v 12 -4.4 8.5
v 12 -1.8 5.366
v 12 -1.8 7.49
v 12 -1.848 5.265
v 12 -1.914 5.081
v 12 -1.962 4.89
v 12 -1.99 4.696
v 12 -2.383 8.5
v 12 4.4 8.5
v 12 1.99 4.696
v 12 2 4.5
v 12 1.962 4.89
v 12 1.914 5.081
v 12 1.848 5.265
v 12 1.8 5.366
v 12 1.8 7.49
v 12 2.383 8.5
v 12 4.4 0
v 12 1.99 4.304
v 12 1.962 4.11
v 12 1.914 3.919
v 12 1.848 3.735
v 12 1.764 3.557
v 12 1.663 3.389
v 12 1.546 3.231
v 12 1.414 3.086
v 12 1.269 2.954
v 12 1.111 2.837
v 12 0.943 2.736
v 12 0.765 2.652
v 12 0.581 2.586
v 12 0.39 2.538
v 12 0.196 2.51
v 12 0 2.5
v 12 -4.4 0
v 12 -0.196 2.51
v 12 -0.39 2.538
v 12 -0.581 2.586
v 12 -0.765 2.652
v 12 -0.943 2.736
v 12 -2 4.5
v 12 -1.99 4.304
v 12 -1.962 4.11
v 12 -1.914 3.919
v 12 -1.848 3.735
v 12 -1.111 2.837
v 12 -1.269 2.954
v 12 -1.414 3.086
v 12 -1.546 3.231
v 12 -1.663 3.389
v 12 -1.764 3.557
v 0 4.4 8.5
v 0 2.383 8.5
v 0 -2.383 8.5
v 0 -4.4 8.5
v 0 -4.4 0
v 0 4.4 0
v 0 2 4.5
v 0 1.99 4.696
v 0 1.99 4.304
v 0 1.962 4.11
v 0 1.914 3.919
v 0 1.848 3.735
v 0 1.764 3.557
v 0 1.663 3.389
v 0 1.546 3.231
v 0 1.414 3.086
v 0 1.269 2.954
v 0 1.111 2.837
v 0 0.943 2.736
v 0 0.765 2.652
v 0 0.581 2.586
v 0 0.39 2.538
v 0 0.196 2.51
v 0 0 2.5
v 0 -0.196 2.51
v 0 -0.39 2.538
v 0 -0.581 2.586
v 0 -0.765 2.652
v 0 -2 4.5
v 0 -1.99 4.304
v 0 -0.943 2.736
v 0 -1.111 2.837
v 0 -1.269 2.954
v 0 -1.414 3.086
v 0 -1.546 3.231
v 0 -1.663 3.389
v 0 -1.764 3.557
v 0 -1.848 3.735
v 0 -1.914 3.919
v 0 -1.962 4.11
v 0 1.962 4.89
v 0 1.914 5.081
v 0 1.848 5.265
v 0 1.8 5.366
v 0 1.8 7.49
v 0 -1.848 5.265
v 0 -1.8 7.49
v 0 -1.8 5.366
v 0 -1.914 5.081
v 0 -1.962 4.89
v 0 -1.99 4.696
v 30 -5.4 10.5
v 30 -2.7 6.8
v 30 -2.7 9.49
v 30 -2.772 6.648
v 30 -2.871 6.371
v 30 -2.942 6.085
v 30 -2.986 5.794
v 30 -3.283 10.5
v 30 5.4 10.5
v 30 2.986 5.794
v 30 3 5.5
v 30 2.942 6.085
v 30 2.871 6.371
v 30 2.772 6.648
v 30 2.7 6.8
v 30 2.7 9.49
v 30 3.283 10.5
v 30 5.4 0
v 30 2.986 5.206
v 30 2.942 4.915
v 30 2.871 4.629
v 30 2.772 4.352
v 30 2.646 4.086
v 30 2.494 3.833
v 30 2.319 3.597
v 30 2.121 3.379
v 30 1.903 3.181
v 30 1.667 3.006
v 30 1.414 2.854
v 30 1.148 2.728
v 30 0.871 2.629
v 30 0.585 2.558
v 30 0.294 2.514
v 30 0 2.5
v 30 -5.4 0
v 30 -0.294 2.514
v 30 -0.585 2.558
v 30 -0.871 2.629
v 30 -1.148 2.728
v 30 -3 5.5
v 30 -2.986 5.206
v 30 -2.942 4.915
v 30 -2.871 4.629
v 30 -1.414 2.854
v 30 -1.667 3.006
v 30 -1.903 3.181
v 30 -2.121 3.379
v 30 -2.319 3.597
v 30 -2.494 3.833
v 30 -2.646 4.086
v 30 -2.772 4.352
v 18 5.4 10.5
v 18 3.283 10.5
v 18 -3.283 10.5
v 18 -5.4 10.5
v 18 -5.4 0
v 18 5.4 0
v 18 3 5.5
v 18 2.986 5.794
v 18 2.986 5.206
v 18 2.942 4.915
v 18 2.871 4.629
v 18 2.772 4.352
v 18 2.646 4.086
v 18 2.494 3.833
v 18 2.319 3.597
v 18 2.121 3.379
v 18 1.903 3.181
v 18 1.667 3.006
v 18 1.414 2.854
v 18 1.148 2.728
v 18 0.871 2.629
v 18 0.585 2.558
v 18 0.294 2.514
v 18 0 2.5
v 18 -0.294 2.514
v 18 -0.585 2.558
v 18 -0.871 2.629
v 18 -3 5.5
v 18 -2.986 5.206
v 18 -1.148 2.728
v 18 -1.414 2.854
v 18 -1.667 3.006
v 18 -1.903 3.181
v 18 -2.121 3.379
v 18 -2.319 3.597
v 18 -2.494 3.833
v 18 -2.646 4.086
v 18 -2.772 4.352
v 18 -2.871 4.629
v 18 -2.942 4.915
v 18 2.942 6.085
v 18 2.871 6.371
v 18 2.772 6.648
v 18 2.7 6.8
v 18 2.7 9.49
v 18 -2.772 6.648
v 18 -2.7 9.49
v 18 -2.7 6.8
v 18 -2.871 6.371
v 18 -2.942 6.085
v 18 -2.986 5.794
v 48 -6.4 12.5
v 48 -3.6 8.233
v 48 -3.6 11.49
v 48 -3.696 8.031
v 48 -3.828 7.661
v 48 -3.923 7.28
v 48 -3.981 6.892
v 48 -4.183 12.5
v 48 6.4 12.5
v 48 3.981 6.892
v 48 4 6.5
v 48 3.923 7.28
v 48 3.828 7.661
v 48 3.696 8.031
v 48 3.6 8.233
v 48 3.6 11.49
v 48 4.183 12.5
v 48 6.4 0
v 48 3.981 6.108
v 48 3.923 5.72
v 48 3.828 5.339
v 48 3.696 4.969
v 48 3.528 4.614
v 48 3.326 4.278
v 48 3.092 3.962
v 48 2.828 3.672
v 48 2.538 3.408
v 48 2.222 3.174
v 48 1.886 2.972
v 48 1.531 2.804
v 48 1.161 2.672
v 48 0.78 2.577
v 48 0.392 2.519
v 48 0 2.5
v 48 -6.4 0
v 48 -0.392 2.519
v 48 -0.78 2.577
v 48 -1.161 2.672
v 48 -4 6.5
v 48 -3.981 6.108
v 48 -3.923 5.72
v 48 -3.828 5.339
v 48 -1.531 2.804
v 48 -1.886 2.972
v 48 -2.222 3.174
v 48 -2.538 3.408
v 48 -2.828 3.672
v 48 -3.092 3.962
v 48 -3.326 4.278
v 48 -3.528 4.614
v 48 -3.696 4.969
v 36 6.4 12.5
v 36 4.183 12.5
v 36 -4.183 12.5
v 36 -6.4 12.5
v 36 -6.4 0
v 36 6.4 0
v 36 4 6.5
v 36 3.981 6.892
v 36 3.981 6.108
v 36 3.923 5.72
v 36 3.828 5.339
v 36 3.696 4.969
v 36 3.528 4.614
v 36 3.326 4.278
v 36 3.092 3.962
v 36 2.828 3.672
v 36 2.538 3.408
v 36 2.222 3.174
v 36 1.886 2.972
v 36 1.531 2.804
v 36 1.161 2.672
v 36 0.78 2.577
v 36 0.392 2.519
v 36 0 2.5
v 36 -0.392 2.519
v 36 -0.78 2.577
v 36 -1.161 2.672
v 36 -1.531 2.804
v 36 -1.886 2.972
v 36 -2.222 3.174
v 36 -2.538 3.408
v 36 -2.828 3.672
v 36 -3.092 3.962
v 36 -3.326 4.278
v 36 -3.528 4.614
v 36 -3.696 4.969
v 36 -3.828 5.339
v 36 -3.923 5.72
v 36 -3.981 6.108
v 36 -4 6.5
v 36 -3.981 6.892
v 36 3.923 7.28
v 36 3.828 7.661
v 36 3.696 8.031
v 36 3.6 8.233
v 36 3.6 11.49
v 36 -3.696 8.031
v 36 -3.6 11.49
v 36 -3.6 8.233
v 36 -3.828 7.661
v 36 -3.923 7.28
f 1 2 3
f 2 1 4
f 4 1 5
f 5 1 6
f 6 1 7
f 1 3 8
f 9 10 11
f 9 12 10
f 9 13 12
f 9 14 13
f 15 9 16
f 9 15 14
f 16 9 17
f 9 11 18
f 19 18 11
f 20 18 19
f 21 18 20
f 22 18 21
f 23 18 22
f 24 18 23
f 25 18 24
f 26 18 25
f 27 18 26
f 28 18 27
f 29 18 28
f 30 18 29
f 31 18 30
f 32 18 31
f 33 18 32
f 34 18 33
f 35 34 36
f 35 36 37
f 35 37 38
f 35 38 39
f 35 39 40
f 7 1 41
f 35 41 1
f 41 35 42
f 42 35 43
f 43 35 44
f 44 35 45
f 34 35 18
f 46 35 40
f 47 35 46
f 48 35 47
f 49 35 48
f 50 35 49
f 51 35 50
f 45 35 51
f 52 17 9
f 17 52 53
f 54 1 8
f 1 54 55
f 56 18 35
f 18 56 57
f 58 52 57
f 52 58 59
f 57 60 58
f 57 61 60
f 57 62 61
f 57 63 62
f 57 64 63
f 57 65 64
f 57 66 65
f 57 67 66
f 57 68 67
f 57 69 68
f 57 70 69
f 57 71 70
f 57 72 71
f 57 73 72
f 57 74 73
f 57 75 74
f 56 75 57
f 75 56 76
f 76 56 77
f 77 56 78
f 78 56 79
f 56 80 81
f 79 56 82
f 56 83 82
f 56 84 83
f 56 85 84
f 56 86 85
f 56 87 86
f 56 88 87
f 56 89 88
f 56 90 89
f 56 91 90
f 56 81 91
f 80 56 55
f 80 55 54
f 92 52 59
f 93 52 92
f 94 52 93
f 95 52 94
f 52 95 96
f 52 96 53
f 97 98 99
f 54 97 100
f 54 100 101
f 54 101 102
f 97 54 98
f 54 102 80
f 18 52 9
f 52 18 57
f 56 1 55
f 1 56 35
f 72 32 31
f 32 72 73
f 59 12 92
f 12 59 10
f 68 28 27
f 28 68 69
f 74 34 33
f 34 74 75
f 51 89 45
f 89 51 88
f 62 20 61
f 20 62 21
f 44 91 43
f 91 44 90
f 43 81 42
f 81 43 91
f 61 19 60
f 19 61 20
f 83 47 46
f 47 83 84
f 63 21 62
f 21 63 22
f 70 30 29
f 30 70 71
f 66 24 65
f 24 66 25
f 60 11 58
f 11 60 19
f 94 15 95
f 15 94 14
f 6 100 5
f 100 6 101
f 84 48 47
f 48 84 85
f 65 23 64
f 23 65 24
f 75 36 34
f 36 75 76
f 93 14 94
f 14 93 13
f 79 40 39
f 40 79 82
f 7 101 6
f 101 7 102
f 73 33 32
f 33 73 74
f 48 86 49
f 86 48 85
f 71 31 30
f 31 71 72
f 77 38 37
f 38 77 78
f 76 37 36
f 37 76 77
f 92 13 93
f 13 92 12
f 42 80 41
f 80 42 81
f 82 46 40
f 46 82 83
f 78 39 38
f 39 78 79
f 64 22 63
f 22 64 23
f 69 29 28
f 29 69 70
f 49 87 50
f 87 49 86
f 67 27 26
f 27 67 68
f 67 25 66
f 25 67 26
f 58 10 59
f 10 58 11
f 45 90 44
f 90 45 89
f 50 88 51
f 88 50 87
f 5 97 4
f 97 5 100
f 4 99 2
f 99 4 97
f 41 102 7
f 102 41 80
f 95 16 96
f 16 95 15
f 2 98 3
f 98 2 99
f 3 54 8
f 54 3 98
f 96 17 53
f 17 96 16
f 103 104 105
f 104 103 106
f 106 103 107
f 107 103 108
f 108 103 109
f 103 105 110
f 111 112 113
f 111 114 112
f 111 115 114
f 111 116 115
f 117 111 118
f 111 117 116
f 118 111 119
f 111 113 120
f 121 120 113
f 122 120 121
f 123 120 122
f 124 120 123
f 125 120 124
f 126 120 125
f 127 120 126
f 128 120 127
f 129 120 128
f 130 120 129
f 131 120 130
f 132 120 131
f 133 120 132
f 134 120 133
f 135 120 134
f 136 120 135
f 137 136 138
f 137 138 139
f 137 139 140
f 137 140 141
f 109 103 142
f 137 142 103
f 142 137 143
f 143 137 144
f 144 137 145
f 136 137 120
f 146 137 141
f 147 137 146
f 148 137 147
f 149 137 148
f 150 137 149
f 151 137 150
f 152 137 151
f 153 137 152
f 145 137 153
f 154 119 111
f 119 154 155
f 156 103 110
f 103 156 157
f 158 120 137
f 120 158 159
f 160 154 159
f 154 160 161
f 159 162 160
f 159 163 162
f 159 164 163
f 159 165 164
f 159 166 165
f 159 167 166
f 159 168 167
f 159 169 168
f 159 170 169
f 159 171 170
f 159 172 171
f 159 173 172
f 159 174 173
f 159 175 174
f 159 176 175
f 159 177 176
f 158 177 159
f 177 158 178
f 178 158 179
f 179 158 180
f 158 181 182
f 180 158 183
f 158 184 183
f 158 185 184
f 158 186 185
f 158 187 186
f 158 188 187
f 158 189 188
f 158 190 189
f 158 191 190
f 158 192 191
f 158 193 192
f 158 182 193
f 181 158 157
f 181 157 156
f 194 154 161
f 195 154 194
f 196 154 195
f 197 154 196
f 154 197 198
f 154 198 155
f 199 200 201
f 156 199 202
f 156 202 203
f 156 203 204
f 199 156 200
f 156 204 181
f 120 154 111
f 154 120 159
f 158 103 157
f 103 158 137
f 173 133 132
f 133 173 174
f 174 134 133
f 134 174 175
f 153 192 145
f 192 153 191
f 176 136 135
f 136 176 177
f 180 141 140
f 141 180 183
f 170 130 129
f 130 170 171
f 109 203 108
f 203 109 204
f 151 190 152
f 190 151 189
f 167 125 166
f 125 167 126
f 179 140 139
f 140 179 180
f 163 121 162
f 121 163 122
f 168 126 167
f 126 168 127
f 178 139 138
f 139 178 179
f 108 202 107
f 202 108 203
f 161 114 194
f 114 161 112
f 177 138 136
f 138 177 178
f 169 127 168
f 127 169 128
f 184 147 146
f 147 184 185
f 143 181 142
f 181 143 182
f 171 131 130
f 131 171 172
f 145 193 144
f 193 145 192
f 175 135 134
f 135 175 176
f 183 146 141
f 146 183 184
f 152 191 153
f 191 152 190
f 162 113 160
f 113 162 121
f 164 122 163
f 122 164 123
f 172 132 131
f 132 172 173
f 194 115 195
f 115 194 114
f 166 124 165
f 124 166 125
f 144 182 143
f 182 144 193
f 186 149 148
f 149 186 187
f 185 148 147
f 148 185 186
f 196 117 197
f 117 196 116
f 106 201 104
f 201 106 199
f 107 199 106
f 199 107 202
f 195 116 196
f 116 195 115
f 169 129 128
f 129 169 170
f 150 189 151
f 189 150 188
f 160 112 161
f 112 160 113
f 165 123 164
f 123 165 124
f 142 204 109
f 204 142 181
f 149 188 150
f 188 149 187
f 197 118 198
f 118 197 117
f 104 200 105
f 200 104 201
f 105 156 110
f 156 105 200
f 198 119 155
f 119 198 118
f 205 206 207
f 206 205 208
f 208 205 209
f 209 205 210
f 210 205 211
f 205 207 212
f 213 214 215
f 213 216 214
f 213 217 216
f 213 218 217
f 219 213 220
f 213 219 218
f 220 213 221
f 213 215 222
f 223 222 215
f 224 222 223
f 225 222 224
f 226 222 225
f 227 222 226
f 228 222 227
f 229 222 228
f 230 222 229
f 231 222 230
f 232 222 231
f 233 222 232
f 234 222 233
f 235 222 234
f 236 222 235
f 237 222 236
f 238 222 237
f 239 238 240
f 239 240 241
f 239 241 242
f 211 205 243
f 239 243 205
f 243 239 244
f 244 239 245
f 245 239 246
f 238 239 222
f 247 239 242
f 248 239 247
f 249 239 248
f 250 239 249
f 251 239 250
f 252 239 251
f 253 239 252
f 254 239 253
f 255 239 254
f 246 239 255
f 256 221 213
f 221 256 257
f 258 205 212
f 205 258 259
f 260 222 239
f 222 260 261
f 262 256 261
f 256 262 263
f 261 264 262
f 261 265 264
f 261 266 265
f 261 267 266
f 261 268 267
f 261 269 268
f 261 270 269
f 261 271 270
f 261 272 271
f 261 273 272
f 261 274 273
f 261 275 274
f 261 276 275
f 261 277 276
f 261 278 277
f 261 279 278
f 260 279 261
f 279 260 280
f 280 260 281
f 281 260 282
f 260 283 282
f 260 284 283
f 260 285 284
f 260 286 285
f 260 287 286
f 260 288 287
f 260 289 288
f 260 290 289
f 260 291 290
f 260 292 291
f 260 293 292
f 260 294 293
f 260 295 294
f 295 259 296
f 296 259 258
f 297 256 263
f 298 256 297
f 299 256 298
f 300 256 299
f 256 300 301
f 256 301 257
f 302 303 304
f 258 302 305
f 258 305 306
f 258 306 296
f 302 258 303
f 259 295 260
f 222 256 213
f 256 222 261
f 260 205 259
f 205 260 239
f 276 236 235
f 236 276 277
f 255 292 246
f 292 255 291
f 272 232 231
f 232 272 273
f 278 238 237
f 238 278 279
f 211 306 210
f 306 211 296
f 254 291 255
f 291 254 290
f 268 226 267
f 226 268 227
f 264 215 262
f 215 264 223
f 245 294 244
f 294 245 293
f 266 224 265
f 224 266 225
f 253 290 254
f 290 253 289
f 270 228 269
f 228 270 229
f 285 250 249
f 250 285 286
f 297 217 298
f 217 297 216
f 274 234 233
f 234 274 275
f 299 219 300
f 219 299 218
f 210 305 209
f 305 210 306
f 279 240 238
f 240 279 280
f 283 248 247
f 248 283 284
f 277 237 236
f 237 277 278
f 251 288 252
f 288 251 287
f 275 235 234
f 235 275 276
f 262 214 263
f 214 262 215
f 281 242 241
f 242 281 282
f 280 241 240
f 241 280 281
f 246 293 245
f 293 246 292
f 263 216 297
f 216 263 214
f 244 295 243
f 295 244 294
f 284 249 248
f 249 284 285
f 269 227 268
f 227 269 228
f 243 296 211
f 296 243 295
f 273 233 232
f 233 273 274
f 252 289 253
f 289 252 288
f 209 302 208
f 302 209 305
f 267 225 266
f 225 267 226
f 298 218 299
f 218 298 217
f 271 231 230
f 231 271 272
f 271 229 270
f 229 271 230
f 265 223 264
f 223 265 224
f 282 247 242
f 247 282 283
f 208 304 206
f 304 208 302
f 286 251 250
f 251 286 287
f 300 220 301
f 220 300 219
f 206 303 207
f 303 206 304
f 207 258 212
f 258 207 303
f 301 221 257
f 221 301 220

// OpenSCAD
// =============================================================================
// idea-015 桌面理线夹（夹持线径 4 / 6 / 8mm 三规格，一次打三颗）
//
// 一颗夹子 = 贴胶面平贴热床的长方块 + 沿 X 穿过的圆孔（走线）+ 从顶部开进去的
// 窄卡入口（槽宽 = 0.9×线径，比线细才有卡持），入口顶部做 30° 喇叭好塞线。
//
// 打印朝向：贴胶面（z=0）平贴热床 —— 侧壁全竖直；入口是竖直窄槽（不封顶，
//   所以圆孔顶部不需要桥接）；只有入口喇叭那两面是 30°（< 45°）的坡，免支撑。
// 双面胶：整块贴胶面（clip_w × dd）都是平的，胶带贴在 z=0 这一面。
// 单件外廓 <= 25 x 25 x 20（check.py 逐规格对账）；三颗沿 X 排开一次打完。
//
// 三规格共用一套参数，只按 d_line 算 r / 孔中心高 / 总高 / 总宽（model.py 同式重算）。
// =============================================================================

// ---------- 参数（唯一数字来源） ----------
clip_w      = 12;     // 沿走线方向（X）的宽度
tape_base   = 2.5;    // 贴胶面到穿线孔最低点的实心厚度（胶带粘贴面）
side_wall   = 2.4;    // 穿线孔两侧壁厚
top_wall    = 2.0;    // 穿线孔顶到件顶的壁厚
slot_ratio  = 0.9;    // 卡入口宽 / 线径（<1 才有卡持；>=1 就是敞口托）
flare_h     = 1;      // 入口喇叭高度
flare_ang   = 30;     // 喇叭张角（离竖直方向；< 45 免支撑）
pack_gap    = 6;      // 一次打多颗时的间距
min_wall    = 2.4;    // 最薄实心壁厚下限（0.4 喷嘴 6 条线）
single_max  = 25;     // 单件外廓上限（主人要求 <=25x25x20）
single_max_h = 20;
arc_facets  = 48;     // 孔壁圆弧分段（剖面用；0.01mm 弦差量级）
F_CYL       = 64;

// ---------- 数据：三规格 [名字, 线径 d, 排布起点 x] ----------
clip_rows = [
  ["夹 φ4", 4,  0],
  ["夹 φ6", 6, 18],
  ["夹 φ8", 8, 36],
];

// ---------- 几何 ----------
function z_axis_of(d) = tape_base + d / 2;            // 孔中心高
function h_of(d)      = tape_base + d + top_wall;      // 件总高
function dd_of(d)     = d + 2 * side_wall;             // 件总宽（Y）

module clip(d, x0) {
  w = clip_w;
  za = z_axis_of(d);
  h = h_of(d);
  dd = dd_of(d);
  flare_w2 = slot_ratio * d + 2 * (flare_h + 0.5) * tan(flare_ang);
  translate([x0, 0, 0])
    difference() {
      translate([w / 2, 0, h / 2]) cube([w, dd, h], center = true);
      // 走线孔：沿 X 穿过
      translate([w / 2, 0, za])
        rotate([0, 90, 0]) cylinder(d = d, h = w + 2, center = true, $fn = F_CYL);
      // 卡入口窄槽：从孔顶一路开到件顶
      translate([w / 2, 0, (za + h + 2) / 2])
        cube([w + 2, slot_ratio * d, h + 2 - za], center = true);
      // 入口喇叭：30° 外扩（< 45° 免支撑）
      translate([w / 2, 0, 0])
        hull() {
          translate([0, 0, h - flare_h]) cube([w + 2, slot_ratio * d, 0.02], center = true);
          translate([0, 0, h + 0.5]) cube([w + 2, flare_w2, 0.02], center = true);
        }
    }
}

union() {
  for (row = clip_rows) clip(row[1], row[2]);
}
